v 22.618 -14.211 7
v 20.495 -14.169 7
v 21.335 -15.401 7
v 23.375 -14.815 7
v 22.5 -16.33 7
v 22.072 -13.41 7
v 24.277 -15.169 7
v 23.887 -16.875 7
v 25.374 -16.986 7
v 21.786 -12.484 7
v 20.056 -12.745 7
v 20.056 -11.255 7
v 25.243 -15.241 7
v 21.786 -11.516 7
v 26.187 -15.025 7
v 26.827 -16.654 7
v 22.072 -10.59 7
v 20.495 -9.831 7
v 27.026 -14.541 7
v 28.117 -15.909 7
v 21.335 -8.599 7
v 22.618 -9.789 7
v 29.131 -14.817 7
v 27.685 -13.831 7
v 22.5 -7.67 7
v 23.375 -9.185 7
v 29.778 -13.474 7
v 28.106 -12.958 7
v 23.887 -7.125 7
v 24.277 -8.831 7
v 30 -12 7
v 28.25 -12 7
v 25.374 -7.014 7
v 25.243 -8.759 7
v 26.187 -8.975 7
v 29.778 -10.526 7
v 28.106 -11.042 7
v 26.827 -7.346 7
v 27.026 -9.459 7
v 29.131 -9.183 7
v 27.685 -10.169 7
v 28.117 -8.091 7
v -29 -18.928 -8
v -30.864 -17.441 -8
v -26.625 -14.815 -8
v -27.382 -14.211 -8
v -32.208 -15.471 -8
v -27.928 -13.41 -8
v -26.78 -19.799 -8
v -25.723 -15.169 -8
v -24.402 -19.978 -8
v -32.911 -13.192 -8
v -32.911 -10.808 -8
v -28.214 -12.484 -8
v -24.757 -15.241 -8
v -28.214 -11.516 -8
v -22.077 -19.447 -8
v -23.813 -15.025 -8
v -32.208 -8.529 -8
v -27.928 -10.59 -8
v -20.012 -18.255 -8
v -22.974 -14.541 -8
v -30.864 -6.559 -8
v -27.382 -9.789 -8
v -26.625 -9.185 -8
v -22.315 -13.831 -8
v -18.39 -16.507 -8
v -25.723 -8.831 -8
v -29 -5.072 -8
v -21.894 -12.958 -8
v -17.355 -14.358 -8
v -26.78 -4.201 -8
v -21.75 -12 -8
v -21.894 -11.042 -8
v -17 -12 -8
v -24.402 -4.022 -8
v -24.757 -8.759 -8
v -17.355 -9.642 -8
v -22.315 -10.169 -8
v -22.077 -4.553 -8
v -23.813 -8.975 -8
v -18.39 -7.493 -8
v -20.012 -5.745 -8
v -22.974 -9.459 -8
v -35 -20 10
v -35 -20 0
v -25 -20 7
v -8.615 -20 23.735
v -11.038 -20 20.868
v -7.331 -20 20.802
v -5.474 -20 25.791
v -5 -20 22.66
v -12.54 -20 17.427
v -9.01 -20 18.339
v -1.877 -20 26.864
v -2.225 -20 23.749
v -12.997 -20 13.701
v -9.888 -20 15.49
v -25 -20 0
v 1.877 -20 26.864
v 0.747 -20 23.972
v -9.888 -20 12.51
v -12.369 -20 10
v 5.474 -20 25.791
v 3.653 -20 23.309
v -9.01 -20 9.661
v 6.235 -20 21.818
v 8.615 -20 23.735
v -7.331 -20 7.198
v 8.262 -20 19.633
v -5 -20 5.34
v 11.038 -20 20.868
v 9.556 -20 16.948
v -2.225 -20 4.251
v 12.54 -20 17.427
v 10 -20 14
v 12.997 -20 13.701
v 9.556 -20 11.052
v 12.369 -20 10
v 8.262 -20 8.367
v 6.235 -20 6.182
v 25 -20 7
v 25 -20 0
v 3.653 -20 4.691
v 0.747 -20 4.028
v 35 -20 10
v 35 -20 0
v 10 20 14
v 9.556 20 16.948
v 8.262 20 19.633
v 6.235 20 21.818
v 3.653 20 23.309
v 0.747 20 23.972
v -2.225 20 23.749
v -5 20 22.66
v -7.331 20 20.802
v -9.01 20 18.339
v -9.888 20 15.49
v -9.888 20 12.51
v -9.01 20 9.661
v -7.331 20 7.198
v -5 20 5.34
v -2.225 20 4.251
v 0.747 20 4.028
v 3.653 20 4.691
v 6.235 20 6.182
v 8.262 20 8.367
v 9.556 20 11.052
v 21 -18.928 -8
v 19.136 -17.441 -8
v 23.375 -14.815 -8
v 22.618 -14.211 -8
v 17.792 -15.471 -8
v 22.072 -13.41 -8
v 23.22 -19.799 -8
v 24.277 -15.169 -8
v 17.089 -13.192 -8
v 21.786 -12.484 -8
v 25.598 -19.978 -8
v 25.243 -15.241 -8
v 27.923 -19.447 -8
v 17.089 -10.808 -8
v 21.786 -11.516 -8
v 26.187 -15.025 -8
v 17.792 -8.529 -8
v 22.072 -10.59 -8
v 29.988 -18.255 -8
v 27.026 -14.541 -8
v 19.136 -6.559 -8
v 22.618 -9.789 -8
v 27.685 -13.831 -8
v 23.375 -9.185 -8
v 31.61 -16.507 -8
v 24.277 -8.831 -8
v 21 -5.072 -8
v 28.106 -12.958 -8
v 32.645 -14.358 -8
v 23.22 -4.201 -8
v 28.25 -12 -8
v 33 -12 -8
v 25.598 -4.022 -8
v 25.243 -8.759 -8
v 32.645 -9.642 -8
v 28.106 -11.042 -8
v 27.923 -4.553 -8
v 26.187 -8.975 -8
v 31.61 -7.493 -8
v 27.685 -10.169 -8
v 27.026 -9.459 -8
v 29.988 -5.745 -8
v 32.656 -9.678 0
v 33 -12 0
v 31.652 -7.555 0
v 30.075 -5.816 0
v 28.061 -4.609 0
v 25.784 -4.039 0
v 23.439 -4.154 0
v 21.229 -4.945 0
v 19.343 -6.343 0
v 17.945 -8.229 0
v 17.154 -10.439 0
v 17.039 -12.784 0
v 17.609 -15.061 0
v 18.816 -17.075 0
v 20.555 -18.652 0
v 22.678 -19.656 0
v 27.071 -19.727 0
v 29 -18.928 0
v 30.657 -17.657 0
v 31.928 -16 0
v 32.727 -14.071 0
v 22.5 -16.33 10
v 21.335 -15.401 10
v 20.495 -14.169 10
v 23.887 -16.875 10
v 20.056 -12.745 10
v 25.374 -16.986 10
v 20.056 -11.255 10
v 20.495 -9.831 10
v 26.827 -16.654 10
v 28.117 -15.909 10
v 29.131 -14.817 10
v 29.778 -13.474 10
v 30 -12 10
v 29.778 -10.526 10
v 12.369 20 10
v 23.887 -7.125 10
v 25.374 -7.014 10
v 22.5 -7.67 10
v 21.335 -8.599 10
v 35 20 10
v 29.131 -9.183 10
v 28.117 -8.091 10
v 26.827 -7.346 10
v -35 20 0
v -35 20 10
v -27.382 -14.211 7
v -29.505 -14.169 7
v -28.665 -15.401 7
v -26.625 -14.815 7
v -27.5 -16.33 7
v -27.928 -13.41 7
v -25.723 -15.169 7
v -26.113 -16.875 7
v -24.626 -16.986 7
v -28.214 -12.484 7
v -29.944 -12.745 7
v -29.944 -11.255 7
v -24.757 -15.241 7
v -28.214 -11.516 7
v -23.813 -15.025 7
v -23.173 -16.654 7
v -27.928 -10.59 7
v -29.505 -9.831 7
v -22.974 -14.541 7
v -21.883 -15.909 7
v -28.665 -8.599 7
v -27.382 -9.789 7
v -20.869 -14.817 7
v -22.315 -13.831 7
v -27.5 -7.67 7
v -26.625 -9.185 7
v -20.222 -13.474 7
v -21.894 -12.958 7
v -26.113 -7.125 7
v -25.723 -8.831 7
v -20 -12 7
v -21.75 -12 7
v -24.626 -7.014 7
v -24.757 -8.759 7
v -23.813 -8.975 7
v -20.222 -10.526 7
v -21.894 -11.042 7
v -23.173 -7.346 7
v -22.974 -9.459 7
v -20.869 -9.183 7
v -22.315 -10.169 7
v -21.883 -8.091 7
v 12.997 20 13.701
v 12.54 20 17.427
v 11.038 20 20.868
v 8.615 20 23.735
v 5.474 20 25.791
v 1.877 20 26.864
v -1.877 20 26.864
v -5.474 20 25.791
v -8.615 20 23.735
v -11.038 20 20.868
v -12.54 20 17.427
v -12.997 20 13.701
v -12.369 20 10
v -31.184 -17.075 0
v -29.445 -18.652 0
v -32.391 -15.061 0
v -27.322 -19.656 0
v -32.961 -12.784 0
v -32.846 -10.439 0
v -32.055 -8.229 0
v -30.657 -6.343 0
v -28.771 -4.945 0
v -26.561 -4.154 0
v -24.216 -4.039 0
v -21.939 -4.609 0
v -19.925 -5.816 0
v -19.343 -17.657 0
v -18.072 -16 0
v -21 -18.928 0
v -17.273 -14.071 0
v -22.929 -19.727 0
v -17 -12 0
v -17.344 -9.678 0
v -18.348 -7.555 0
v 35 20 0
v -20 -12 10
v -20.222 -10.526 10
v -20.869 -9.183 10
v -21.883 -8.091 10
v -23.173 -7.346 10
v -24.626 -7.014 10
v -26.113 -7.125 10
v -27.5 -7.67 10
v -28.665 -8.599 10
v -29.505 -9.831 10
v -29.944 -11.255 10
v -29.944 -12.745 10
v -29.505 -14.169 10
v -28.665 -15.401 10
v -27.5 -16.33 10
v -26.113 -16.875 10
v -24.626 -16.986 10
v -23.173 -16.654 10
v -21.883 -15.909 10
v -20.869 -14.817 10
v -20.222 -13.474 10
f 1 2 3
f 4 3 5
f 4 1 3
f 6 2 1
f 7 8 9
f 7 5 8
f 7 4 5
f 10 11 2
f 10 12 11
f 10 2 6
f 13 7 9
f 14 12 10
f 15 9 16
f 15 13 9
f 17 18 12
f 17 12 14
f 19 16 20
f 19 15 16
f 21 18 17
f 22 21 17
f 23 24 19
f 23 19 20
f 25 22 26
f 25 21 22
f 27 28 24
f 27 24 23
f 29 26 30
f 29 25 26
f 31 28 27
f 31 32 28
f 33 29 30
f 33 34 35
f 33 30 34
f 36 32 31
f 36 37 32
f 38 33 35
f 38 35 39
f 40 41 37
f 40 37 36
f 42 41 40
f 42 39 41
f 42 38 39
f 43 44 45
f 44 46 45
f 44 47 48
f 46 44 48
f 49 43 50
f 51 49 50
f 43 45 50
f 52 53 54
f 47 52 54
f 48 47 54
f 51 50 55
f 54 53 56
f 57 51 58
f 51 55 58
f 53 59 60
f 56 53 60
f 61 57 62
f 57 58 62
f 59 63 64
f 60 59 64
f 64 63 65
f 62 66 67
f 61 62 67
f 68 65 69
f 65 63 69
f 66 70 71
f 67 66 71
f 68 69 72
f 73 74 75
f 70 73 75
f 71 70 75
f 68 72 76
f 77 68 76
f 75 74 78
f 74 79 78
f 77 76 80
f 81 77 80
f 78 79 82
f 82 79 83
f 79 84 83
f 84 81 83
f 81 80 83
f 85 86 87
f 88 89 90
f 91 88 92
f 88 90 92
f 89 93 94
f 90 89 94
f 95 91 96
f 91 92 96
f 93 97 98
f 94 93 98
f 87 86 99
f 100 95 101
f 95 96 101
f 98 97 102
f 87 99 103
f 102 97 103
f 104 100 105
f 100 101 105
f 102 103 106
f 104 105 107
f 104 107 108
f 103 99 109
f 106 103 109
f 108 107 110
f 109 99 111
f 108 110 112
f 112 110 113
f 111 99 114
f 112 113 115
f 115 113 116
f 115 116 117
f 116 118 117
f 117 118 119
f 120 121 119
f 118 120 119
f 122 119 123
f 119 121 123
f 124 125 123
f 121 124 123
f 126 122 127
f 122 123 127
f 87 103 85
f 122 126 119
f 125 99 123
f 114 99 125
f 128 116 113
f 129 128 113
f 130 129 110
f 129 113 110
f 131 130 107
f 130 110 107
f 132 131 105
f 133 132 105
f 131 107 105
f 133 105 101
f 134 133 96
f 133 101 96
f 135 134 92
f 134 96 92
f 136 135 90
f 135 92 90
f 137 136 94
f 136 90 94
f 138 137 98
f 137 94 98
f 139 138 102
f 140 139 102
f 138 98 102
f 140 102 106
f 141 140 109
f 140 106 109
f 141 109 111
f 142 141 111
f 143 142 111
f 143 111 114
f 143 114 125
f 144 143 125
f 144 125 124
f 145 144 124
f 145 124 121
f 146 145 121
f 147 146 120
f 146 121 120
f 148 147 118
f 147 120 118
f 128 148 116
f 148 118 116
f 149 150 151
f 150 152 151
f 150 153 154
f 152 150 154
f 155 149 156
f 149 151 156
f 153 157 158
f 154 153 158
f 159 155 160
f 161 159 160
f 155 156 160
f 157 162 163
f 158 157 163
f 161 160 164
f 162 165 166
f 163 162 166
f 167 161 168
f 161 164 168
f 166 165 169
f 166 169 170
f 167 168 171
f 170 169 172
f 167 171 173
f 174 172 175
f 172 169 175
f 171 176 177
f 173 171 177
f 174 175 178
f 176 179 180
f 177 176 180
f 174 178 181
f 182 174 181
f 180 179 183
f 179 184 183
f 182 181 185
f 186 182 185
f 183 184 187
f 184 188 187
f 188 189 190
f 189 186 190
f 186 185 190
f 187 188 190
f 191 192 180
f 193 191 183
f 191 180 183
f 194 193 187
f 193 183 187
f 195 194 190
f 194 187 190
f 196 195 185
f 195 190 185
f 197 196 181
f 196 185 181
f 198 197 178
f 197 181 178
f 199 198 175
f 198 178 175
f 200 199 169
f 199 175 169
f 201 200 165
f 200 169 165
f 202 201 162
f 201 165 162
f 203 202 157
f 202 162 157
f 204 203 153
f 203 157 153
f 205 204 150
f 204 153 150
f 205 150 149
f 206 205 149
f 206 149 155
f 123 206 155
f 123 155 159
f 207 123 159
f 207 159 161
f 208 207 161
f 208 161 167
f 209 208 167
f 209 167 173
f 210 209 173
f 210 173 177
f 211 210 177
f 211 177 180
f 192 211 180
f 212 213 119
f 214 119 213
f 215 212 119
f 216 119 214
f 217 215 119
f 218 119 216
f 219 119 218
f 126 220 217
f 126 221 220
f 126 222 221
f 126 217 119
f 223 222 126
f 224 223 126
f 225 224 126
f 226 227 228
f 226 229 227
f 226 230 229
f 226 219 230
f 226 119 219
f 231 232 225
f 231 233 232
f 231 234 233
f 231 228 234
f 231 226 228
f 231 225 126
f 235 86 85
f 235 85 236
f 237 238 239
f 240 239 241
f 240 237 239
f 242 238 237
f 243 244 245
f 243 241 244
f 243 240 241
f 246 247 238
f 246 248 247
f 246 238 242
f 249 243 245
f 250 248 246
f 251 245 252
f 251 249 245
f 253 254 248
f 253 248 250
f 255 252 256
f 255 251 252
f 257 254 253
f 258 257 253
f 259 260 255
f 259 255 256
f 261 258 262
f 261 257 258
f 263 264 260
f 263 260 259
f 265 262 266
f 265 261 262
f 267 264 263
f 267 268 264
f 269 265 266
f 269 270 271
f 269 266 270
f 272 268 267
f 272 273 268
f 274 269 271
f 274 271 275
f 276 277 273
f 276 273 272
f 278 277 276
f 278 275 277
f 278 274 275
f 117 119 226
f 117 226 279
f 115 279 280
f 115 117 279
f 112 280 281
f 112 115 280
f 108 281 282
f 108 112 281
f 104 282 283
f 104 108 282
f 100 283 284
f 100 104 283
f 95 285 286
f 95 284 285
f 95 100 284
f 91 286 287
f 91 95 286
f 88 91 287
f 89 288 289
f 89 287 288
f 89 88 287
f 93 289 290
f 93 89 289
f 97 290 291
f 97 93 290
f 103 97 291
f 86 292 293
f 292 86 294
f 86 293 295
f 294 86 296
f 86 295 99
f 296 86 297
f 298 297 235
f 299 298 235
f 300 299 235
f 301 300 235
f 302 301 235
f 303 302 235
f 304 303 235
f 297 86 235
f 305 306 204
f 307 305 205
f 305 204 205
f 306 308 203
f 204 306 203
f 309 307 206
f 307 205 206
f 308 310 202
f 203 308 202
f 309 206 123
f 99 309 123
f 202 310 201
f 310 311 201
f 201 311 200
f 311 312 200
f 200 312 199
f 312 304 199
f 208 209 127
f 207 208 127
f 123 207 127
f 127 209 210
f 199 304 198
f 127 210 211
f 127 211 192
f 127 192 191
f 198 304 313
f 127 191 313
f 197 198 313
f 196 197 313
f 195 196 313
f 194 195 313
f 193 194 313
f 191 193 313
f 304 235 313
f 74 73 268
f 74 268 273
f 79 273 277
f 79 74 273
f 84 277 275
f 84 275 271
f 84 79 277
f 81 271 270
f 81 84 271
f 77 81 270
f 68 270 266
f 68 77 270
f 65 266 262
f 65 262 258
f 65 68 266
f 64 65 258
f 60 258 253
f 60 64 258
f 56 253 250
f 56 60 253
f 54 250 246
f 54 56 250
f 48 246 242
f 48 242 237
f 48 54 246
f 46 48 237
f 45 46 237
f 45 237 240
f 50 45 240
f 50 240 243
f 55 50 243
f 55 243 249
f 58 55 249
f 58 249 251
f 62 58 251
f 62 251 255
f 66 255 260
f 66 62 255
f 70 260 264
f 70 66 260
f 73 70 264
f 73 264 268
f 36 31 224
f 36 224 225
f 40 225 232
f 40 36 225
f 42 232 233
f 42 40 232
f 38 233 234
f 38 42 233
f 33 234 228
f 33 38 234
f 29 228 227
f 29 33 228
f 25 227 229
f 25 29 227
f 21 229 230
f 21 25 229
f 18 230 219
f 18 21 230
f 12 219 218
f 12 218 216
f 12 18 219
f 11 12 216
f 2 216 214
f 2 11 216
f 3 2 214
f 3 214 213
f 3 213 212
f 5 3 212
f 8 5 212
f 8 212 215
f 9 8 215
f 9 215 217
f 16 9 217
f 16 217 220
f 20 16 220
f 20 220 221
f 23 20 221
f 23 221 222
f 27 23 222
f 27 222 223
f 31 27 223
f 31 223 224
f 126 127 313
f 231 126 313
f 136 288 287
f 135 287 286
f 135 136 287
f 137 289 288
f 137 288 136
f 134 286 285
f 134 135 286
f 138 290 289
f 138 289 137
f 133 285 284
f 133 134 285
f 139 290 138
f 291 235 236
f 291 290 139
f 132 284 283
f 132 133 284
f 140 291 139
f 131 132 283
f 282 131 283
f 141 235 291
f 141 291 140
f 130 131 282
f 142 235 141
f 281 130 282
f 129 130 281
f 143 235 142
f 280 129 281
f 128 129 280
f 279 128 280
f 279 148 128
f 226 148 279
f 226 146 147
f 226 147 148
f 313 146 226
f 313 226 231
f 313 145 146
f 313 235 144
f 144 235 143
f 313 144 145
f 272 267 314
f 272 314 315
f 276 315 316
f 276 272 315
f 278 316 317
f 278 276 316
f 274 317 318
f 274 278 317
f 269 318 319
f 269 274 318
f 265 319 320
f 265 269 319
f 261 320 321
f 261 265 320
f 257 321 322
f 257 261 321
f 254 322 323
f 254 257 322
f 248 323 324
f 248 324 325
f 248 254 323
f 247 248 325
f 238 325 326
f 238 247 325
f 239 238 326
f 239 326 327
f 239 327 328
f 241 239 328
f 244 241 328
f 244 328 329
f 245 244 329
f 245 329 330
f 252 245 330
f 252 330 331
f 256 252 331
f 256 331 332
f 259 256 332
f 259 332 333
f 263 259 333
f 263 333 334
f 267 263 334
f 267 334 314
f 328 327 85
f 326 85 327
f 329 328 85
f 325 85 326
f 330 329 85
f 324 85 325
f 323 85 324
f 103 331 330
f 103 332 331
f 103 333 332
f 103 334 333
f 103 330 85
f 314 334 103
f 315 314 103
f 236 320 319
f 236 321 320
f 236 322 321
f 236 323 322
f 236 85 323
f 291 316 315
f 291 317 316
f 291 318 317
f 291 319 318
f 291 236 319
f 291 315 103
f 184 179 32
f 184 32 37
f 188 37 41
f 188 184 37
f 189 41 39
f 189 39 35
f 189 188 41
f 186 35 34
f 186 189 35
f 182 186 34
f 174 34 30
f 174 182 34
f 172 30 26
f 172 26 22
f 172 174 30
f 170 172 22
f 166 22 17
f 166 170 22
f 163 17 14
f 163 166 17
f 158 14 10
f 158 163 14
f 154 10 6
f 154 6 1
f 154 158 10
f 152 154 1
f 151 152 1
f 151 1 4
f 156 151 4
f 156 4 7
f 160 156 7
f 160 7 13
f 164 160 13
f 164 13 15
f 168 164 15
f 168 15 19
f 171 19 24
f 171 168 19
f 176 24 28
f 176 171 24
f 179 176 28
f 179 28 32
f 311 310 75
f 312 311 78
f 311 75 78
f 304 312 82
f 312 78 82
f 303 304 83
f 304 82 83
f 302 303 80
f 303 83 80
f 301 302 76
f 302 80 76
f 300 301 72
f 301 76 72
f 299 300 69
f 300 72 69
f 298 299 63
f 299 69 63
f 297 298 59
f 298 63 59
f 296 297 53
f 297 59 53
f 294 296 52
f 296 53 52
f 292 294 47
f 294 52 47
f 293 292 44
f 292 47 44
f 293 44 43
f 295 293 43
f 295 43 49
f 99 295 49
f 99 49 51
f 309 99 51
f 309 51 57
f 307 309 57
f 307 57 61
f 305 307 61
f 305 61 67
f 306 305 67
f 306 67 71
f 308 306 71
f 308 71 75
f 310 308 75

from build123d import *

# Parameters (mm, degrees)
SKETCH002_AS_DRAWN_R                 = 13
SKETCH002_AS_DRAWN_R_2               = 10
EXTRUDE002_DEPTH                     = 40
EXTRUDE002_ONTO_SKETCH002_ROLL_ANGLE = 90
SKETCH003_AS_DRAWN_R                 = 13
EXTRUDE003_DEPTH                     = 40
EXTRUDE003_ONTO_SKETCH003_ROLL_ANGLE = 90
SKETCH_W                             = 70
SKETCH_H                             = 40
SKETCH_R                             = 5
EXTRUDE_DEPTH                        = 10
SKETCH001_R                          = 8
SKETCH001_R_2                        = 3.25
EXTRUDE001_DEPTH                     = 15


with BuildPart() as extrude002:
    # Sketch002 as drawn → Extrude002 (new)
    with BuildSketch(Plane.XY):
        Circle(SKETCH002_AS_DRAWN_R)
        Circle(SKETCH002_AS_DRAWN_R_2, mode=Mode.SUBTRACT)
    extrude(amount=-EXTRUDE002_DEPTH)


with BuildPart() as extrude002_1:
    # Extrude002 onto Sketch002 roll: moved
    add(extrude002.part.rotate(Axis((0, 0, 0), (1, 0, 0)), EXTRUDE002_ONTO_SKETCH002_ROLL_ANGLE))


with BuildPart() as extrude002_2:
    # Extrude002 onto Sketch002 placement: moved
    add(extrude002_1.part)


with BuildPart() as extrude002_3:
    # Extrude002 placement: moved
    add(extrude002_2.part.moved(Location((0, -20, 14))))


with BuildPart() as extrude003:
    # Sketch003 as drawn → Extrude003 (new)
    with BuildSketch(Plane.XY):
        Circle(SKETCH003_AS_DRAWN_R)
    extrude(amount=-EXTRUDE003_DEPTH)


with BuildPart() as extrude003_1:
    # Extrude003 onto Sketch003 roll: moved
    add(extrude003.part.rotate(Axis((0, 0, 0), (1, 0, 0)), EXTRUDE003_ONTO_SKETCH003_ROLL_ANGLE))


with BuildPart() as extrude003_2:
    # Extrude003 onto Sketch003 placement: moved
    add(extrude003_1.part)


with BuildPart() as extrude003_3:
    # Extrude003 placement: moved
    add(extrude003_2.part.moved(Location((0, -20, 14))))


with BuildPart() as cut:
    # Sketch → Extrude (new body)
    with BuildSketch(Plane.XY):
        Rectangle(SKETCH_W, SKETCH_H)
        with Locations((-25, -12)):
            Circle(SKETCH_R, mode=Mode.SUBTRACT)
        with Locations((25, -12)):
            Circle(SKETCH_R, mode=Mode.SUBTRACT)
    extrude(amount=EXTRUDE_DEPTH)

    # Cut: cut Extrude003
    add(extrude003_3.part, mode=Mode.SUBTRACT)


with BuildPart() as fusion:
    # Sketch001 → Extrude001 (new body)
    with BuildSketch(Plane.XY):
        with Locations((-25, -12)):
            Circle(SKETCH001_R)
        with Locations((-25, -12)):
            Circle(SKETCH001_R_2, mode=Mode.SUBTRACT)
        with Locations((25, -12)):
            Circle(SKETCH001_R)
        with Locations((25, -12)):
            Circle(SKETCH001_R_2, mode=Mode.SUBTRACT)
    extrude(amount=EXTRUDE001_DEPTH)


with BuildPart() as fusion_1:
    # Extrude001 placement: moved
    add(fusion.part.moved(Location((0, 0, -8))))

    # Fusion: union Extrude002, Cut
    add(extrude002_3.part)
    add(cut.part)


solid = fusion_1.part
